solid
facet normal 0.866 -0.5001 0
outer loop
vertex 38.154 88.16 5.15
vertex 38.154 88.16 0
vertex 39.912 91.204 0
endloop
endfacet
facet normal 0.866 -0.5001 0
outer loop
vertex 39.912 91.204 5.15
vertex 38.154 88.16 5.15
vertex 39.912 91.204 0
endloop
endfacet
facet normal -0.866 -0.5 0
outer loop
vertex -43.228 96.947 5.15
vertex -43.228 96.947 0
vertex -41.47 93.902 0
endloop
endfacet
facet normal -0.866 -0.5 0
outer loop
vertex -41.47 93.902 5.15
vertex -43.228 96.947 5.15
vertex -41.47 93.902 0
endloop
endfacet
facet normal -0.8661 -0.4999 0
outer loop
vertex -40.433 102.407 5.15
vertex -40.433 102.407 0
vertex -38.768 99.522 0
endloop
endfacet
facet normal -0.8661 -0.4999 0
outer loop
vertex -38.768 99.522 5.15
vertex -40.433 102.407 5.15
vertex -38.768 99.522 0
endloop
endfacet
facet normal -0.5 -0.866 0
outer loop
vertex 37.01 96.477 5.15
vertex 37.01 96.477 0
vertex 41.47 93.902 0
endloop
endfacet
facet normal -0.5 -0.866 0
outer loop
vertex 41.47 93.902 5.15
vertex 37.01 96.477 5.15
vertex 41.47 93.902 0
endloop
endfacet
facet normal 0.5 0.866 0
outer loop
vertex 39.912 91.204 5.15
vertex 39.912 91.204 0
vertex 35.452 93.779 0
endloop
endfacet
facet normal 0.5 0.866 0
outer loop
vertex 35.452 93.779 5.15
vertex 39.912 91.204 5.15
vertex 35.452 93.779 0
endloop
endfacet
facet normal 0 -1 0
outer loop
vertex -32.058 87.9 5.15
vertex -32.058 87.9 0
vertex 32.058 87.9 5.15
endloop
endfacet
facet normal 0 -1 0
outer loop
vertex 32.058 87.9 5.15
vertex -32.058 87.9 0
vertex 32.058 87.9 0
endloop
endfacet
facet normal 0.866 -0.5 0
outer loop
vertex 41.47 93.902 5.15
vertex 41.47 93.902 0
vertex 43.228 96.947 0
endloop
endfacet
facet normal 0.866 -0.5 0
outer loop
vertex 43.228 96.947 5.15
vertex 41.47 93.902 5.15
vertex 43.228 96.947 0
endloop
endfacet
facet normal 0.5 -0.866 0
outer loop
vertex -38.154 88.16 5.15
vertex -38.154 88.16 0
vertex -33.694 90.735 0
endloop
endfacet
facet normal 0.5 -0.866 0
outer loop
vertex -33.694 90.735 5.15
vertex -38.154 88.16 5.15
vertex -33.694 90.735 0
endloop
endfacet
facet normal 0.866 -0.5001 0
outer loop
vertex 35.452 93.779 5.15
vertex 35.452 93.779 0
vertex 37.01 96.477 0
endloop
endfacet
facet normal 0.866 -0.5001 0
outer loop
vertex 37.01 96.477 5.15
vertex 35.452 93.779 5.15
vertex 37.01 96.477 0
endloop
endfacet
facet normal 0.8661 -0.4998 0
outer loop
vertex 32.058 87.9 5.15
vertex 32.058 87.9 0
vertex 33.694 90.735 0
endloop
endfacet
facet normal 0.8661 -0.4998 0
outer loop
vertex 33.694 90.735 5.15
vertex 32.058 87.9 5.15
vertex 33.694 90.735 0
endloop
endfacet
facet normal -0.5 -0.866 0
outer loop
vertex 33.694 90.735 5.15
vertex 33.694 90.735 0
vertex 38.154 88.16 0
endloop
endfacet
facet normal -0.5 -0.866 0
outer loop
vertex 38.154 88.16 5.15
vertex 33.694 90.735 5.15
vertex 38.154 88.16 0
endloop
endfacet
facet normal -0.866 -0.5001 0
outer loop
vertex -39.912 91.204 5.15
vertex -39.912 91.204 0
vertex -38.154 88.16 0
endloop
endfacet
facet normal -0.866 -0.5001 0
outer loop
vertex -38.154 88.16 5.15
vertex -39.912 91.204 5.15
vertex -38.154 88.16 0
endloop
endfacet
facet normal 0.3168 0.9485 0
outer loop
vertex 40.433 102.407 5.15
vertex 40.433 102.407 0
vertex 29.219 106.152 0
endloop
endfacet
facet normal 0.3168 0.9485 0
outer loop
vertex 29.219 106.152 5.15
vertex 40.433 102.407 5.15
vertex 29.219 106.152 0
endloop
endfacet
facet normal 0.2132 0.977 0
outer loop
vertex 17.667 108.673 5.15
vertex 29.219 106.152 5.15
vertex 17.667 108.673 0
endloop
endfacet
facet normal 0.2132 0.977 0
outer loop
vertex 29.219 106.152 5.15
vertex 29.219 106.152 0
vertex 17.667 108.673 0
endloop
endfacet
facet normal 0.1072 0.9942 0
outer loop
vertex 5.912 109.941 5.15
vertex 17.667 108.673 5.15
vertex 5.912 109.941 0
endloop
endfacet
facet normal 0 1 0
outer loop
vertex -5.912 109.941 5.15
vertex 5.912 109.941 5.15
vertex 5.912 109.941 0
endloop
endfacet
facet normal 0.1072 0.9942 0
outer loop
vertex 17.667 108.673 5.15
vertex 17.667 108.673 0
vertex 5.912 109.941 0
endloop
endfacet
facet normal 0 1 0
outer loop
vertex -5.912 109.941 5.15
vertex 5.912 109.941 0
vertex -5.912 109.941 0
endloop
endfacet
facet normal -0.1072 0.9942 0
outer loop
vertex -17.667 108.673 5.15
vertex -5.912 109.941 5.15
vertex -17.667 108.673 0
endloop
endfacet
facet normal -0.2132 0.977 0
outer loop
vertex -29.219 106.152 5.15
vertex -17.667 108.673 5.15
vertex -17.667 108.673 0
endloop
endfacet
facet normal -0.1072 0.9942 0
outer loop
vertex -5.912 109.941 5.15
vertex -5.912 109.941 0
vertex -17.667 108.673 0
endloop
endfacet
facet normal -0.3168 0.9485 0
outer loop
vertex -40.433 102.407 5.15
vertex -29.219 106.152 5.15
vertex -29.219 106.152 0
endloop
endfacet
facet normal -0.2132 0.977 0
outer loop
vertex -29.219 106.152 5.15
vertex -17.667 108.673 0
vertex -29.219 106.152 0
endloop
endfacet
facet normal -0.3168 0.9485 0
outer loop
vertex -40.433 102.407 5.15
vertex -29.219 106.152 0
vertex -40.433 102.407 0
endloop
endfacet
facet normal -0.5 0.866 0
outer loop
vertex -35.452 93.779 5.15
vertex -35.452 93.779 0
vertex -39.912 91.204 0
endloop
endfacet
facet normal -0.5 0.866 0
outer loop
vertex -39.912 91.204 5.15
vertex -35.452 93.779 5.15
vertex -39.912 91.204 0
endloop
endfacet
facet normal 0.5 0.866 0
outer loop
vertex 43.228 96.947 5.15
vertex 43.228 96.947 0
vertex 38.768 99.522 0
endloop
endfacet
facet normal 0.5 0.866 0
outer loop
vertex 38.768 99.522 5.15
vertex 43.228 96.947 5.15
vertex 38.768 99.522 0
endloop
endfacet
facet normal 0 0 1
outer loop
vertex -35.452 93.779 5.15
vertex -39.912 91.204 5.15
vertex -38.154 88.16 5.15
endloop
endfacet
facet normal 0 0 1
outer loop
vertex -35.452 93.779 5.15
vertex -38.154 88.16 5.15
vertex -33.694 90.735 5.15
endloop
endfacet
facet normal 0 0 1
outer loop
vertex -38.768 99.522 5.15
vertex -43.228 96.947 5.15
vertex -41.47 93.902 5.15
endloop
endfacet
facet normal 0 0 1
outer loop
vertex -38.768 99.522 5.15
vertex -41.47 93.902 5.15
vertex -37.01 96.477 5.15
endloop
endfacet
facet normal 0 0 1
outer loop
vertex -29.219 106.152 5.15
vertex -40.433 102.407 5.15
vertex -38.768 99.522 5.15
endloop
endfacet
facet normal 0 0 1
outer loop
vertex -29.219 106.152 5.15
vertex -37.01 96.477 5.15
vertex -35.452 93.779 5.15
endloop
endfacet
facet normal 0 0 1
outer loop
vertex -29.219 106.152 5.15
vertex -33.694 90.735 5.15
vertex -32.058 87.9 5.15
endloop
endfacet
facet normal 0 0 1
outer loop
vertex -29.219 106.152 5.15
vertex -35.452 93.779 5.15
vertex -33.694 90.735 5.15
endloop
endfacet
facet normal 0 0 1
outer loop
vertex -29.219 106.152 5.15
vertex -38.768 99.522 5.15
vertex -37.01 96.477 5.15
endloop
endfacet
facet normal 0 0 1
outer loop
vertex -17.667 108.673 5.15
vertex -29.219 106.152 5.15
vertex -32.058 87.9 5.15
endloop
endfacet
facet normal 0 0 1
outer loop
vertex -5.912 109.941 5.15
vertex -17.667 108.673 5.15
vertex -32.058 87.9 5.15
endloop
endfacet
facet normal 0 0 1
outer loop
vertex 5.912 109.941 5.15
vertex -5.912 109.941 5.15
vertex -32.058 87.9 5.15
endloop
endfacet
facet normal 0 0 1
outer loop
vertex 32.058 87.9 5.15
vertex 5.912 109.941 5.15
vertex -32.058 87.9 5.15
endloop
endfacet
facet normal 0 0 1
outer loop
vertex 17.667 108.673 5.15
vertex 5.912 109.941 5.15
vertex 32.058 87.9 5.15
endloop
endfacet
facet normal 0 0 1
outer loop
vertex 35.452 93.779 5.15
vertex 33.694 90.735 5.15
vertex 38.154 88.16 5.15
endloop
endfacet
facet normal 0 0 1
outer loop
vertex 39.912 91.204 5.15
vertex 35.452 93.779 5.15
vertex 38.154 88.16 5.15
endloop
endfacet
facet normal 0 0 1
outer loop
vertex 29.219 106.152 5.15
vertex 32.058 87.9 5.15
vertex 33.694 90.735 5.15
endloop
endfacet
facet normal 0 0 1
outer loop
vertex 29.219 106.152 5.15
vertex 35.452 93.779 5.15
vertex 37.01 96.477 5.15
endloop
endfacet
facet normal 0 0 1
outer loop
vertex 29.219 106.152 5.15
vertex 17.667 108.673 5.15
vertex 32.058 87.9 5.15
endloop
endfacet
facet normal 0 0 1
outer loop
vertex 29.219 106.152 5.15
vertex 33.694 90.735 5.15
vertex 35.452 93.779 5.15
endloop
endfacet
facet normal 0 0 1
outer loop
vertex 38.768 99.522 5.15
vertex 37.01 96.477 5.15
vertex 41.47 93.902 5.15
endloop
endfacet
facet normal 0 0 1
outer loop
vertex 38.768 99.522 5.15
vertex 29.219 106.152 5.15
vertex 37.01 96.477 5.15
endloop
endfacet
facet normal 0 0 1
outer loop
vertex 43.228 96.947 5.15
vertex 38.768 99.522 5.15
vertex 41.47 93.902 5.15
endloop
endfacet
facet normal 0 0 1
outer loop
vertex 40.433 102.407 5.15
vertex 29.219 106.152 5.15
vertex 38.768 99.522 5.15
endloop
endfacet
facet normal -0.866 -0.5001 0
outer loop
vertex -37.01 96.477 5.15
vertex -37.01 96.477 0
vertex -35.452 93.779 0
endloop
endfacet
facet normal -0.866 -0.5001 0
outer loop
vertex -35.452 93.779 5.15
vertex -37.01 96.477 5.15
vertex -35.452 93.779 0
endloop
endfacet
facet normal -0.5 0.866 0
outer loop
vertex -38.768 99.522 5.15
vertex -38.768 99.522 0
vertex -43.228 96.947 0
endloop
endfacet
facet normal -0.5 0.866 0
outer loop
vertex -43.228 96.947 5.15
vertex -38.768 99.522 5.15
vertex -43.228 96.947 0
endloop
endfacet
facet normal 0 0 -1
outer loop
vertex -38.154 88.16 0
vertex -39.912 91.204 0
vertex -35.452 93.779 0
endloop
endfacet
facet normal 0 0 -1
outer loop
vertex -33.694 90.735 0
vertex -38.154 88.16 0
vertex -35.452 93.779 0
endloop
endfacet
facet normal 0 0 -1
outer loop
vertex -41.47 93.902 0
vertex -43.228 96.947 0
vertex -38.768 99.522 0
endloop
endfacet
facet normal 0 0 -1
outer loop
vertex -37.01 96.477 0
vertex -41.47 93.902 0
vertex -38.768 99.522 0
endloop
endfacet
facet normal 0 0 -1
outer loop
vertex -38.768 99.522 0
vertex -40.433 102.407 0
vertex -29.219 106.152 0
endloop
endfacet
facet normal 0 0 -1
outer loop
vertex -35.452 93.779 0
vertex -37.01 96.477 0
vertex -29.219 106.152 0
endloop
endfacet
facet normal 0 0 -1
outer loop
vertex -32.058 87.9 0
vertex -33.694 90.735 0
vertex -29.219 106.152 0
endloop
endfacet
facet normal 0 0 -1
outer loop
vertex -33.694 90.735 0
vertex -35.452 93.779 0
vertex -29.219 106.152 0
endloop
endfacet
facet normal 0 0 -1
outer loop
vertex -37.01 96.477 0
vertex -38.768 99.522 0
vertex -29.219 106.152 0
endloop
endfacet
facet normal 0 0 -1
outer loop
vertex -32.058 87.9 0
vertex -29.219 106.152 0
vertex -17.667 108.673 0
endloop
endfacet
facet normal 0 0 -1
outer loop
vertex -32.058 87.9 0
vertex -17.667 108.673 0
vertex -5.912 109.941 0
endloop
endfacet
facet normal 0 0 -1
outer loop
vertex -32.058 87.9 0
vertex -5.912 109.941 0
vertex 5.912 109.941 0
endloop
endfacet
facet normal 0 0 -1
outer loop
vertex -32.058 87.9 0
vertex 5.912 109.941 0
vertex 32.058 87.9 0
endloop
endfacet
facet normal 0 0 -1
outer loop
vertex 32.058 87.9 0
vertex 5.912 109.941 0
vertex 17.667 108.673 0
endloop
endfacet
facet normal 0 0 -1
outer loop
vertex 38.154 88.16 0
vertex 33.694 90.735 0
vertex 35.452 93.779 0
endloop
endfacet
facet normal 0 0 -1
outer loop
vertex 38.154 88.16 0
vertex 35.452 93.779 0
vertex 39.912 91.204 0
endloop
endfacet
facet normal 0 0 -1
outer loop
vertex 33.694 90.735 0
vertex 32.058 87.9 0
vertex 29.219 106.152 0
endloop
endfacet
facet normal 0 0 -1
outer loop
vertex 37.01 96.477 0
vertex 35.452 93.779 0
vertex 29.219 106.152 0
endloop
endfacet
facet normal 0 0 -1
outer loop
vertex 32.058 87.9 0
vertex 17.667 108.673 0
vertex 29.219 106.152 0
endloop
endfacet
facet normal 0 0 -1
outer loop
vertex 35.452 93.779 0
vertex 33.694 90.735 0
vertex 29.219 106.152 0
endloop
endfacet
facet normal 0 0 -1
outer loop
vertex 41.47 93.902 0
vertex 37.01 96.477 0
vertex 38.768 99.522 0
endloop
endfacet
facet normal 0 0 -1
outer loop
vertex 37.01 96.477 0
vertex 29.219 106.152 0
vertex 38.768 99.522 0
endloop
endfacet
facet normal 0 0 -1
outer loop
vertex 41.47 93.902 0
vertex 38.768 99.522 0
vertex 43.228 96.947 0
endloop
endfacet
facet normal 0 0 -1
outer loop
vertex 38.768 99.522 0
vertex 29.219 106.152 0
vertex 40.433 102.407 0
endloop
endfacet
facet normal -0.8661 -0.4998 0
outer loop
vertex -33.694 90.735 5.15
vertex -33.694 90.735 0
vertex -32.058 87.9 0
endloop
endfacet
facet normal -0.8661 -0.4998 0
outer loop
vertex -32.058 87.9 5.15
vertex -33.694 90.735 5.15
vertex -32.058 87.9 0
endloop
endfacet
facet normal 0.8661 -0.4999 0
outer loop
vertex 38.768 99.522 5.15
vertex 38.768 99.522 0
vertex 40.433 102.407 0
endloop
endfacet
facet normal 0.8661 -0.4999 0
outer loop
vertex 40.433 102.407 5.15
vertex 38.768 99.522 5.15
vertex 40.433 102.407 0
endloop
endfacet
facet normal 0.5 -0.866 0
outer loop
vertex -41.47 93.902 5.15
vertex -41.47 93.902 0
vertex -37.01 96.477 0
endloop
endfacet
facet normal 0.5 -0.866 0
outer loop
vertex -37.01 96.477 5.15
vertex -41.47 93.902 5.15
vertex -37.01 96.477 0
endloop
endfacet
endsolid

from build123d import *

# Parameters (mm, degrees)
BOSS_EXTRUDE1_DEPTH = 5.15


with BuildPart() as part:
    # Sketch1 → Boss-Extrude1 (new body)
    with BuildSketch(Plane.XY):
        with BuildLine():
            Line((-32.057735027, 87.9), (32.057735027, 87.9))
            Line((32.057735027, 87.9), (33.694332379, 90.734669766))
            Line((33.694332379, 90.734669766), (38.154363209, 88.159669766))
            Line((38.154363209, 88.159669766), (39.912093048, 91.204147153))
            Line((39.912093048, 91.204147153), (35.452062218, 93.779147153))
            Line((35.452062218, 93.779147153), (37.009792057, 96.477214379))
            Line((37.009792057, 96.477214379), (41.469822887, 93.902214379))
            Line((41.469822887, 93.902214379), (43.227552726, 96.946691766))
            Line((43.227552726, 96.946691766), (38.767521896, 99.521691766))
            Line((38.767521896, 99.521691766), (40.433263841, 102.406841447))
            ThreePointArc((40.433263841, 102.406841447), (0, 110.1), (-40.433263841, 102.406841447))
            Line((-40.433263841, 102.406841447), (-38.767521896, 99.521691766))
            Line((-38.767521896, 99.521691766), (-43.227552726, 96.946691766))
            Line((-43.227552726, 96.946691766), (-41.469822887, 93.902214379))
            Line((-41.469822887, 93.902214379), (-37.009792057, 96.477214379))
            Line((-37.009792057, 96.477214379), (-35.452062218, 93.779147153))
            Line((-35.452062218, 93.779147153), (-39.912093048, 91.204147153))
            Line((-39.912093048, 91.204147153), (-38.154363209, 88.159669766))
            Line((-38.154363209, 88.159669766), (-33.694332379, 90.734669766))
            Line((-33.694332379, 90.734669766), (-32.057735027, 87.9))
        make_face()
    extrude(amount=BOSS_EXTRUDE1_DEPTH)


solid = part.part
